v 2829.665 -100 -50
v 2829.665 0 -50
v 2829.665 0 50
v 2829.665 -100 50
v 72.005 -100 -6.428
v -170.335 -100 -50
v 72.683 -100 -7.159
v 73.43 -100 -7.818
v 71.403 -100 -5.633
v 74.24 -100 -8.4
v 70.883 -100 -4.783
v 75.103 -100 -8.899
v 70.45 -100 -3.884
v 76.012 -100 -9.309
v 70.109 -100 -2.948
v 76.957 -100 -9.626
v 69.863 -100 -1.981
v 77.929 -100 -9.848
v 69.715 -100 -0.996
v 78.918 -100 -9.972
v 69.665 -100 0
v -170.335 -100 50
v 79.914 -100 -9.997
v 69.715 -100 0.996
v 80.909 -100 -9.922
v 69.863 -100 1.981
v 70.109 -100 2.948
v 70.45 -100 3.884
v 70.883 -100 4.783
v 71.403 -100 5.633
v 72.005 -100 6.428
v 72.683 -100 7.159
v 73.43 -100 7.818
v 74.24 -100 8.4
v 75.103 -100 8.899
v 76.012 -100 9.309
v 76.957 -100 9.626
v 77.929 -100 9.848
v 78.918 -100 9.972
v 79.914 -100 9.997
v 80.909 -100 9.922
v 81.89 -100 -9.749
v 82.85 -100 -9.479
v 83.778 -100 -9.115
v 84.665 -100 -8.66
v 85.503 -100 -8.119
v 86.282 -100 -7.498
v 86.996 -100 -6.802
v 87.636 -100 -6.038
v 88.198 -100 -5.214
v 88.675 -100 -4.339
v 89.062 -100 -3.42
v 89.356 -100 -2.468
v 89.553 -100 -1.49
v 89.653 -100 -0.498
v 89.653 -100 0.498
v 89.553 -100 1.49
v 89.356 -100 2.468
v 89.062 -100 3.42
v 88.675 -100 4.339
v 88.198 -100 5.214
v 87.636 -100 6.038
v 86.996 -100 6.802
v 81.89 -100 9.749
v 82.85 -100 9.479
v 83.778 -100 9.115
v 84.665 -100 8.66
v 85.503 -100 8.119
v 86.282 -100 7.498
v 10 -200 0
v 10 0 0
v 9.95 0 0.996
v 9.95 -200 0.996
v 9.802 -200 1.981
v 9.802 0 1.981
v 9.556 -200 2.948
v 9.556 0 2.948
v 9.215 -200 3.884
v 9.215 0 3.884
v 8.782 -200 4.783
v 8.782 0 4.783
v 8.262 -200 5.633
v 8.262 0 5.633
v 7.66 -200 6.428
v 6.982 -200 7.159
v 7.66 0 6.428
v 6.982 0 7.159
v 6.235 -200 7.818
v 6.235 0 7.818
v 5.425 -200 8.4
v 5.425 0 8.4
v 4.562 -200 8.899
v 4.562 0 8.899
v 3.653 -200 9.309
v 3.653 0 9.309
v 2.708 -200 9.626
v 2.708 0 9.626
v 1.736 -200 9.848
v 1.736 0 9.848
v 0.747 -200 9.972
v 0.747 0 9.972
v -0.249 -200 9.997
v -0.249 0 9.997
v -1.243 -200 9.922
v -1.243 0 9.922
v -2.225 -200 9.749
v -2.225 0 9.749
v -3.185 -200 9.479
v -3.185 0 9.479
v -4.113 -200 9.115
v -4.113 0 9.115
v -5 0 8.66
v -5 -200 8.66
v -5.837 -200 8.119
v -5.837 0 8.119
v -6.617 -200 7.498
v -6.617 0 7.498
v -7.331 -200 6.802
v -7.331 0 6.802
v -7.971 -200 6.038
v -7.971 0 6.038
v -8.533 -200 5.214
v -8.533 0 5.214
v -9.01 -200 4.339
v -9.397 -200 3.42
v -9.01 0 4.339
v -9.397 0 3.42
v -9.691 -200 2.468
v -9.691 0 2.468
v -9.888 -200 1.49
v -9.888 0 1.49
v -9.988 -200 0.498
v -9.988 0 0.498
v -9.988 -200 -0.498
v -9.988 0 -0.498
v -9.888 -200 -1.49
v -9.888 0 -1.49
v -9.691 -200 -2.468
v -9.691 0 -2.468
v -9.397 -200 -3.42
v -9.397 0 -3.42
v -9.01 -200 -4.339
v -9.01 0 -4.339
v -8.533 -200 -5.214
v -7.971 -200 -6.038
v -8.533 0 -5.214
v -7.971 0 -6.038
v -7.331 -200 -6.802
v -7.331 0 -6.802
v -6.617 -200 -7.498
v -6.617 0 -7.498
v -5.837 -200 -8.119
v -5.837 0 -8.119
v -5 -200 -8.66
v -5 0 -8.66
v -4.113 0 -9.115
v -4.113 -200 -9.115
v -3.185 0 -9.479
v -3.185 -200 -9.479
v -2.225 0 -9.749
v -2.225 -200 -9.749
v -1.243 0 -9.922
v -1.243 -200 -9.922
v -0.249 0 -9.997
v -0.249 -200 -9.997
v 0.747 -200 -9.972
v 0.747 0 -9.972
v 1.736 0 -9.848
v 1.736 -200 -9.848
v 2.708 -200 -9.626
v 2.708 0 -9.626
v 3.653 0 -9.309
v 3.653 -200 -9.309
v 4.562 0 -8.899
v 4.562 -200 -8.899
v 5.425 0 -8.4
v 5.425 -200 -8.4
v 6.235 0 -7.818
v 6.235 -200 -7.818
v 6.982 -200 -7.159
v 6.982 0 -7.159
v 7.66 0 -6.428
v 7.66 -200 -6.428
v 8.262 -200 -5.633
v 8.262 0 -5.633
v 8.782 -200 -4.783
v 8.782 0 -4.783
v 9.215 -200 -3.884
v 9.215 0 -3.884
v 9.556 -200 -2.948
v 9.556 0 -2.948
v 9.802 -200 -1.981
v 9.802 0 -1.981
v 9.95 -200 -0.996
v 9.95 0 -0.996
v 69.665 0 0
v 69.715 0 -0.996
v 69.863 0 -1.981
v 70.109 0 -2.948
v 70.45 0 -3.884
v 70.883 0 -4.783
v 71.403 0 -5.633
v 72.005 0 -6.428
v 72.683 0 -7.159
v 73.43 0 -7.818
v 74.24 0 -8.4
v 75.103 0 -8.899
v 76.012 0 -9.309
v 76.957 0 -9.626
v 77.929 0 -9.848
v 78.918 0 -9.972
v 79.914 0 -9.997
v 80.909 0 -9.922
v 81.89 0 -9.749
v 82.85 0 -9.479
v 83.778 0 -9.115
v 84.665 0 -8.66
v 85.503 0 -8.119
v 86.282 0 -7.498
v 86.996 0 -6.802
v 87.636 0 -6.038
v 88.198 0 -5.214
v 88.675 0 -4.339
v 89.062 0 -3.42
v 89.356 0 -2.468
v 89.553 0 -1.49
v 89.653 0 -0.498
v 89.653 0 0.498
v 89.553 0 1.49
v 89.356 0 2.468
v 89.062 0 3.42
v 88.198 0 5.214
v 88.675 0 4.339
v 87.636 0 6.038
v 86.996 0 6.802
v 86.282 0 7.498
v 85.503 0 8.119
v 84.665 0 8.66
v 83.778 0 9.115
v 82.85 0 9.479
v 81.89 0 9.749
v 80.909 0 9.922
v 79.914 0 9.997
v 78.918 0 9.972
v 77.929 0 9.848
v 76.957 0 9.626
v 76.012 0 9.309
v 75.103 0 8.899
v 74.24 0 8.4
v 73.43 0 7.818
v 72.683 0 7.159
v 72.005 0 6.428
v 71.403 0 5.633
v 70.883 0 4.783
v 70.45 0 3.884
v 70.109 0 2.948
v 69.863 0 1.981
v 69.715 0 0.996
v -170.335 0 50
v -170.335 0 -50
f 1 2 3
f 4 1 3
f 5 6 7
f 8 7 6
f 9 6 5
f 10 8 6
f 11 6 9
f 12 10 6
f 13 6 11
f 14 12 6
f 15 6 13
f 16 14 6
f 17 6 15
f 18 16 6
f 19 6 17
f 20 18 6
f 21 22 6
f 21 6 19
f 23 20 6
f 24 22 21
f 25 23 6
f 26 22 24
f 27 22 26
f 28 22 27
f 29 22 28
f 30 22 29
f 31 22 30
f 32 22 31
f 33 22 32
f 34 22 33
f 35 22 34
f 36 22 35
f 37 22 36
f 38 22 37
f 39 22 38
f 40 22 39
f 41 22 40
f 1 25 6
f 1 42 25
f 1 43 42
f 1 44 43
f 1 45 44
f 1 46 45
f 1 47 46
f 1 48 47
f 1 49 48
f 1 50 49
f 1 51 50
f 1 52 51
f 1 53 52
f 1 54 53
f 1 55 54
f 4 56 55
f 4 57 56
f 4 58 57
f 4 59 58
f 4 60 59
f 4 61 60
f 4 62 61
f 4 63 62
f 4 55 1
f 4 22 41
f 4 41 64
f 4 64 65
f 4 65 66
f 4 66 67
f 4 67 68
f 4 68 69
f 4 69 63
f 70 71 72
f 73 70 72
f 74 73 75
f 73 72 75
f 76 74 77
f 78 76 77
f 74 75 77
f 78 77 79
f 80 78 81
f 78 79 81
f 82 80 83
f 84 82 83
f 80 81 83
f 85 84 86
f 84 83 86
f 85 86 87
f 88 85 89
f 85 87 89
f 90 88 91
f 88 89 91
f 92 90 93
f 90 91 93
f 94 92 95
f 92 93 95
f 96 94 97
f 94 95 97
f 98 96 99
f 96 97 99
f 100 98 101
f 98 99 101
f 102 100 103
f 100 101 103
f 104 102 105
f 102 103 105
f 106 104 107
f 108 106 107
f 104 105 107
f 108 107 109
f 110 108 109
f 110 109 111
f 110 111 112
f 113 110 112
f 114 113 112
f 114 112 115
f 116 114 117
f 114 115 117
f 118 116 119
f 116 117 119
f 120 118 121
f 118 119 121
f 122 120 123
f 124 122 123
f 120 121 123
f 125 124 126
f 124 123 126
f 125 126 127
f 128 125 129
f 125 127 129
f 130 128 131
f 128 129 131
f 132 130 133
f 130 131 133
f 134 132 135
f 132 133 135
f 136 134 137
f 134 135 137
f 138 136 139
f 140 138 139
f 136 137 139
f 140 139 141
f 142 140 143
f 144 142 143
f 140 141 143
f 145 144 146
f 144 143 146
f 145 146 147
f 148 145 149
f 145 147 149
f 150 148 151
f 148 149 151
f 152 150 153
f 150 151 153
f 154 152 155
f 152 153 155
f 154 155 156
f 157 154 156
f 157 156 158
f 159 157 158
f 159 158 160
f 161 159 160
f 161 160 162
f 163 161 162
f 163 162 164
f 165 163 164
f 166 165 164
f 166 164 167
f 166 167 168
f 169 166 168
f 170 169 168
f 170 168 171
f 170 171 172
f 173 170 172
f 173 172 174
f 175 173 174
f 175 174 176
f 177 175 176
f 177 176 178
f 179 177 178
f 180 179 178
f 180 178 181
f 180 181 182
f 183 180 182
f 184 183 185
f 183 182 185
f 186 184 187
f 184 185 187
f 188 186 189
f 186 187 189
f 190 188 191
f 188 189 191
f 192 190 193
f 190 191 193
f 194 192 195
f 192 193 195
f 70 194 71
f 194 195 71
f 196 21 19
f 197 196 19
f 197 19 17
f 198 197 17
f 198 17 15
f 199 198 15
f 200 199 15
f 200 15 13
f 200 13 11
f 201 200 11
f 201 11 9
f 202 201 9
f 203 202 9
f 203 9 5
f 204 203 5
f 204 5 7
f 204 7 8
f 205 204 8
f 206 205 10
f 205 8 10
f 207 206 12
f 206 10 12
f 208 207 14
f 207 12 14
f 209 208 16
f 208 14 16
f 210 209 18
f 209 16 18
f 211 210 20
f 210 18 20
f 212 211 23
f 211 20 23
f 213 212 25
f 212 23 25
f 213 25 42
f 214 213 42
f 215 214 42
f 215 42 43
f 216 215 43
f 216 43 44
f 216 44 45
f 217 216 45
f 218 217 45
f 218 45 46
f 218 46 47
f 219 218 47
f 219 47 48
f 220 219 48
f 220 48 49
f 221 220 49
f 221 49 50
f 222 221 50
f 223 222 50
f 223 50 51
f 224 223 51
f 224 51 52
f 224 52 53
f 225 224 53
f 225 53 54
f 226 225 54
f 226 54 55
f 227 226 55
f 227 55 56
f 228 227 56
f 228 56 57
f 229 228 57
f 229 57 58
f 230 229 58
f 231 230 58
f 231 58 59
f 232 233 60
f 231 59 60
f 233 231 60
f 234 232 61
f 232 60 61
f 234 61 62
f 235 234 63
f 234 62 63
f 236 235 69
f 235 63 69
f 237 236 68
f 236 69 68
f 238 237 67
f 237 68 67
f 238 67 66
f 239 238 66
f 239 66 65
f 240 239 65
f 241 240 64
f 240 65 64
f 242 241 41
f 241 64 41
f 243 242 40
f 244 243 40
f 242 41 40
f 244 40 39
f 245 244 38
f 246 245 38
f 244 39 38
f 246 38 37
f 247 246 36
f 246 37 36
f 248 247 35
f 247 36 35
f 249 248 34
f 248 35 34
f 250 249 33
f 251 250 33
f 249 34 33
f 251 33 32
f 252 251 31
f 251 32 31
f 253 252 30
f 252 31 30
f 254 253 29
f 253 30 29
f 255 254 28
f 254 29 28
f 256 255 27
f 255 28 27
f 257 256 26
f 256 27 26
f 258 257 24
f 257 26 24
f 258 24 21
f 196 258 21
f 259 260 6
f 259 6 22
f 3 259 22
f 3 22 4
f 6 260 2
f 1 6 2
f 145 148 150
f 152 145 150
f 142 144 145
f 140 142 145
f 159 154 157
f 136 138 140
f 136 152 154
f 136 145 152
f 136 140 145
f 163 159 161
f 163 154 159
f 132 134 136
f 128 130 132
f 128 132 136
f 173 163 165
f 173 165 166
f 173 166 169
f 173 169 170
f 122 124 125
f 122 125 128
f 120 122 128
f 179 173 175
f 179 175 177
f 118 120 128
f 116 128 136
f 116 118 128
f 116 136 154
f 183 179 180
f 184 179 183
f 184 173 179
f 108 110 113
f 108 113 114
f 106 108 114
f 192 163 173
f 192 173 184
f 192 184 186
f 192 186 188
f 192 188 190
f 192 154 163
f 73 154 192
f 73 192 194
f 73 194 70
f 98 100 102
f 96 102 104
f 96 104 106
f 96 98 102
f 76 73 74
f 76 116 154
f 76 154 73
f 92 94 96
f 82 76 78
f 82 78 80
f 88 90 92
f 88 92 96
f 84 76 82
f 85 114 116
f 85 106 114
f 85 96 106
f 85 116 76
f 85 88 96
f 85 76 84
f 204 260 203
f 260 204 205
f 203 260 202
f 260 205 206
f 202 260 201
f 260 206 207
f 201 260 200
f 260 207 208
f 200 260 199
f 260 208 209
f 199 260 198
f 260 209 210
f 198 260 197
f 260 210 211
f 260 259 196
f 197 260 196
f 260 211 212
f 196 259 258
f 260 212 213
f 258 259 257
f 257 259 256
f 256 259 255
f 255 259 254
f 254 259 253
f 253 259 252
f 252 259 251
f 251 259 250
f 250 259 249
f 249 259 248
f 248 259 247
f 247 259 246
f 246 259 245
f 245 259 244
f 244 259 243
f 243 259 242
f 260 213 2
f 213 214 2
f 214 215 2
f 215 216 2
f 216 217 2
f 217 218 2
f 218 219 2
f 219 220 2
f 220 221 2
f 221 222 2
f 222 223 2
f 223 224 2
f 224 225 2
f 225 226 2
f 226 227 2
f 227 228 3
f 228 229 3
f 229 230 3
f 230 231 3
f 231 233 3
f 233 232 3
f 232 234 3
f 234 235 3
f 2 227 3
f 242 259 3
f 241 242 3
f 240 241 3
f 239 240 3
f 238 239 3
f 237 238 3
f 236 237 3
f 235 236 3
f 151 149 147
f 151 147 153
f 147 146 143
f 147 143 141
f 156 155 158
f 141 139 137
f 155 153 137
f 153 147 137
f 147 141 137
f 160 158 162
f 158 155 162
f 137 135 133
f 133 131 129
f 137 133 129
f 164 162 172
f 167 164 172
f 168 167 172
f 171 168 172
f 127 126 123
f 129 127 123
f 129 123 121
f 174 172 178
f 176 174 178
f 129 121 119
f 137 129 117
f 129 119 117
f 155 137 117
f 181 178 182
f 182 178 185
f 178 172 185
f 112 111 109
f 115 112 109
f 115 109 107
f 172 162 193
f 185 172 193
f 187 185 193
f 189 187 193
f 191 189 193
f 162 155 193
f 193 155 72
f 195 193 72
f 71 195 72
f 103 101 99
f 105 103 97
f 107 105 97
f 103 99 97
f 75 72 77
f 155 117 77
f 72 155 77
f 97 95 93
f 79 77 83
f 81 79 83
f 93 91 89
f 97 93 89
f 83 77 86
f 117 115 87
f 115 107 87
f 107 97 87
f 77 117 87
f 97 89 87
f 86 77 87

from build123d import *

# Parameters (mm, degrees)
F0_W     = 3000
F0_H     = 100
F1_DEPTH = 100
F2_D     = 20
F3_R     = 10
F4_DEPTH = 200


with BuildPart() as f1:
    # F0 (on Front) → F1 (new body)
    with BuildSketch(Plane.XZ):
        with Locations((1329.66511, 0)):
            Rectangle(F0_W, F0_H)
    extrude(amount=F1_DEPTH)

    # F2 (through all)
    with Locations(Plane(origin=(0, 0, 0), x_dir=(1, 0, 0), z_dir=(0, 1, 0))):
        with Locations((79.66511, 0)):
            Hole(F2_D / 2)


with BuildPart() as f4:
    # F3 (on Front) → F4 (new body)
    with BuildSketch(Plane.XZ):
        Circle(F3_R)
    extrude(amount=F4_DEPTH)


solid = Compound([f1.part, f4.part])
